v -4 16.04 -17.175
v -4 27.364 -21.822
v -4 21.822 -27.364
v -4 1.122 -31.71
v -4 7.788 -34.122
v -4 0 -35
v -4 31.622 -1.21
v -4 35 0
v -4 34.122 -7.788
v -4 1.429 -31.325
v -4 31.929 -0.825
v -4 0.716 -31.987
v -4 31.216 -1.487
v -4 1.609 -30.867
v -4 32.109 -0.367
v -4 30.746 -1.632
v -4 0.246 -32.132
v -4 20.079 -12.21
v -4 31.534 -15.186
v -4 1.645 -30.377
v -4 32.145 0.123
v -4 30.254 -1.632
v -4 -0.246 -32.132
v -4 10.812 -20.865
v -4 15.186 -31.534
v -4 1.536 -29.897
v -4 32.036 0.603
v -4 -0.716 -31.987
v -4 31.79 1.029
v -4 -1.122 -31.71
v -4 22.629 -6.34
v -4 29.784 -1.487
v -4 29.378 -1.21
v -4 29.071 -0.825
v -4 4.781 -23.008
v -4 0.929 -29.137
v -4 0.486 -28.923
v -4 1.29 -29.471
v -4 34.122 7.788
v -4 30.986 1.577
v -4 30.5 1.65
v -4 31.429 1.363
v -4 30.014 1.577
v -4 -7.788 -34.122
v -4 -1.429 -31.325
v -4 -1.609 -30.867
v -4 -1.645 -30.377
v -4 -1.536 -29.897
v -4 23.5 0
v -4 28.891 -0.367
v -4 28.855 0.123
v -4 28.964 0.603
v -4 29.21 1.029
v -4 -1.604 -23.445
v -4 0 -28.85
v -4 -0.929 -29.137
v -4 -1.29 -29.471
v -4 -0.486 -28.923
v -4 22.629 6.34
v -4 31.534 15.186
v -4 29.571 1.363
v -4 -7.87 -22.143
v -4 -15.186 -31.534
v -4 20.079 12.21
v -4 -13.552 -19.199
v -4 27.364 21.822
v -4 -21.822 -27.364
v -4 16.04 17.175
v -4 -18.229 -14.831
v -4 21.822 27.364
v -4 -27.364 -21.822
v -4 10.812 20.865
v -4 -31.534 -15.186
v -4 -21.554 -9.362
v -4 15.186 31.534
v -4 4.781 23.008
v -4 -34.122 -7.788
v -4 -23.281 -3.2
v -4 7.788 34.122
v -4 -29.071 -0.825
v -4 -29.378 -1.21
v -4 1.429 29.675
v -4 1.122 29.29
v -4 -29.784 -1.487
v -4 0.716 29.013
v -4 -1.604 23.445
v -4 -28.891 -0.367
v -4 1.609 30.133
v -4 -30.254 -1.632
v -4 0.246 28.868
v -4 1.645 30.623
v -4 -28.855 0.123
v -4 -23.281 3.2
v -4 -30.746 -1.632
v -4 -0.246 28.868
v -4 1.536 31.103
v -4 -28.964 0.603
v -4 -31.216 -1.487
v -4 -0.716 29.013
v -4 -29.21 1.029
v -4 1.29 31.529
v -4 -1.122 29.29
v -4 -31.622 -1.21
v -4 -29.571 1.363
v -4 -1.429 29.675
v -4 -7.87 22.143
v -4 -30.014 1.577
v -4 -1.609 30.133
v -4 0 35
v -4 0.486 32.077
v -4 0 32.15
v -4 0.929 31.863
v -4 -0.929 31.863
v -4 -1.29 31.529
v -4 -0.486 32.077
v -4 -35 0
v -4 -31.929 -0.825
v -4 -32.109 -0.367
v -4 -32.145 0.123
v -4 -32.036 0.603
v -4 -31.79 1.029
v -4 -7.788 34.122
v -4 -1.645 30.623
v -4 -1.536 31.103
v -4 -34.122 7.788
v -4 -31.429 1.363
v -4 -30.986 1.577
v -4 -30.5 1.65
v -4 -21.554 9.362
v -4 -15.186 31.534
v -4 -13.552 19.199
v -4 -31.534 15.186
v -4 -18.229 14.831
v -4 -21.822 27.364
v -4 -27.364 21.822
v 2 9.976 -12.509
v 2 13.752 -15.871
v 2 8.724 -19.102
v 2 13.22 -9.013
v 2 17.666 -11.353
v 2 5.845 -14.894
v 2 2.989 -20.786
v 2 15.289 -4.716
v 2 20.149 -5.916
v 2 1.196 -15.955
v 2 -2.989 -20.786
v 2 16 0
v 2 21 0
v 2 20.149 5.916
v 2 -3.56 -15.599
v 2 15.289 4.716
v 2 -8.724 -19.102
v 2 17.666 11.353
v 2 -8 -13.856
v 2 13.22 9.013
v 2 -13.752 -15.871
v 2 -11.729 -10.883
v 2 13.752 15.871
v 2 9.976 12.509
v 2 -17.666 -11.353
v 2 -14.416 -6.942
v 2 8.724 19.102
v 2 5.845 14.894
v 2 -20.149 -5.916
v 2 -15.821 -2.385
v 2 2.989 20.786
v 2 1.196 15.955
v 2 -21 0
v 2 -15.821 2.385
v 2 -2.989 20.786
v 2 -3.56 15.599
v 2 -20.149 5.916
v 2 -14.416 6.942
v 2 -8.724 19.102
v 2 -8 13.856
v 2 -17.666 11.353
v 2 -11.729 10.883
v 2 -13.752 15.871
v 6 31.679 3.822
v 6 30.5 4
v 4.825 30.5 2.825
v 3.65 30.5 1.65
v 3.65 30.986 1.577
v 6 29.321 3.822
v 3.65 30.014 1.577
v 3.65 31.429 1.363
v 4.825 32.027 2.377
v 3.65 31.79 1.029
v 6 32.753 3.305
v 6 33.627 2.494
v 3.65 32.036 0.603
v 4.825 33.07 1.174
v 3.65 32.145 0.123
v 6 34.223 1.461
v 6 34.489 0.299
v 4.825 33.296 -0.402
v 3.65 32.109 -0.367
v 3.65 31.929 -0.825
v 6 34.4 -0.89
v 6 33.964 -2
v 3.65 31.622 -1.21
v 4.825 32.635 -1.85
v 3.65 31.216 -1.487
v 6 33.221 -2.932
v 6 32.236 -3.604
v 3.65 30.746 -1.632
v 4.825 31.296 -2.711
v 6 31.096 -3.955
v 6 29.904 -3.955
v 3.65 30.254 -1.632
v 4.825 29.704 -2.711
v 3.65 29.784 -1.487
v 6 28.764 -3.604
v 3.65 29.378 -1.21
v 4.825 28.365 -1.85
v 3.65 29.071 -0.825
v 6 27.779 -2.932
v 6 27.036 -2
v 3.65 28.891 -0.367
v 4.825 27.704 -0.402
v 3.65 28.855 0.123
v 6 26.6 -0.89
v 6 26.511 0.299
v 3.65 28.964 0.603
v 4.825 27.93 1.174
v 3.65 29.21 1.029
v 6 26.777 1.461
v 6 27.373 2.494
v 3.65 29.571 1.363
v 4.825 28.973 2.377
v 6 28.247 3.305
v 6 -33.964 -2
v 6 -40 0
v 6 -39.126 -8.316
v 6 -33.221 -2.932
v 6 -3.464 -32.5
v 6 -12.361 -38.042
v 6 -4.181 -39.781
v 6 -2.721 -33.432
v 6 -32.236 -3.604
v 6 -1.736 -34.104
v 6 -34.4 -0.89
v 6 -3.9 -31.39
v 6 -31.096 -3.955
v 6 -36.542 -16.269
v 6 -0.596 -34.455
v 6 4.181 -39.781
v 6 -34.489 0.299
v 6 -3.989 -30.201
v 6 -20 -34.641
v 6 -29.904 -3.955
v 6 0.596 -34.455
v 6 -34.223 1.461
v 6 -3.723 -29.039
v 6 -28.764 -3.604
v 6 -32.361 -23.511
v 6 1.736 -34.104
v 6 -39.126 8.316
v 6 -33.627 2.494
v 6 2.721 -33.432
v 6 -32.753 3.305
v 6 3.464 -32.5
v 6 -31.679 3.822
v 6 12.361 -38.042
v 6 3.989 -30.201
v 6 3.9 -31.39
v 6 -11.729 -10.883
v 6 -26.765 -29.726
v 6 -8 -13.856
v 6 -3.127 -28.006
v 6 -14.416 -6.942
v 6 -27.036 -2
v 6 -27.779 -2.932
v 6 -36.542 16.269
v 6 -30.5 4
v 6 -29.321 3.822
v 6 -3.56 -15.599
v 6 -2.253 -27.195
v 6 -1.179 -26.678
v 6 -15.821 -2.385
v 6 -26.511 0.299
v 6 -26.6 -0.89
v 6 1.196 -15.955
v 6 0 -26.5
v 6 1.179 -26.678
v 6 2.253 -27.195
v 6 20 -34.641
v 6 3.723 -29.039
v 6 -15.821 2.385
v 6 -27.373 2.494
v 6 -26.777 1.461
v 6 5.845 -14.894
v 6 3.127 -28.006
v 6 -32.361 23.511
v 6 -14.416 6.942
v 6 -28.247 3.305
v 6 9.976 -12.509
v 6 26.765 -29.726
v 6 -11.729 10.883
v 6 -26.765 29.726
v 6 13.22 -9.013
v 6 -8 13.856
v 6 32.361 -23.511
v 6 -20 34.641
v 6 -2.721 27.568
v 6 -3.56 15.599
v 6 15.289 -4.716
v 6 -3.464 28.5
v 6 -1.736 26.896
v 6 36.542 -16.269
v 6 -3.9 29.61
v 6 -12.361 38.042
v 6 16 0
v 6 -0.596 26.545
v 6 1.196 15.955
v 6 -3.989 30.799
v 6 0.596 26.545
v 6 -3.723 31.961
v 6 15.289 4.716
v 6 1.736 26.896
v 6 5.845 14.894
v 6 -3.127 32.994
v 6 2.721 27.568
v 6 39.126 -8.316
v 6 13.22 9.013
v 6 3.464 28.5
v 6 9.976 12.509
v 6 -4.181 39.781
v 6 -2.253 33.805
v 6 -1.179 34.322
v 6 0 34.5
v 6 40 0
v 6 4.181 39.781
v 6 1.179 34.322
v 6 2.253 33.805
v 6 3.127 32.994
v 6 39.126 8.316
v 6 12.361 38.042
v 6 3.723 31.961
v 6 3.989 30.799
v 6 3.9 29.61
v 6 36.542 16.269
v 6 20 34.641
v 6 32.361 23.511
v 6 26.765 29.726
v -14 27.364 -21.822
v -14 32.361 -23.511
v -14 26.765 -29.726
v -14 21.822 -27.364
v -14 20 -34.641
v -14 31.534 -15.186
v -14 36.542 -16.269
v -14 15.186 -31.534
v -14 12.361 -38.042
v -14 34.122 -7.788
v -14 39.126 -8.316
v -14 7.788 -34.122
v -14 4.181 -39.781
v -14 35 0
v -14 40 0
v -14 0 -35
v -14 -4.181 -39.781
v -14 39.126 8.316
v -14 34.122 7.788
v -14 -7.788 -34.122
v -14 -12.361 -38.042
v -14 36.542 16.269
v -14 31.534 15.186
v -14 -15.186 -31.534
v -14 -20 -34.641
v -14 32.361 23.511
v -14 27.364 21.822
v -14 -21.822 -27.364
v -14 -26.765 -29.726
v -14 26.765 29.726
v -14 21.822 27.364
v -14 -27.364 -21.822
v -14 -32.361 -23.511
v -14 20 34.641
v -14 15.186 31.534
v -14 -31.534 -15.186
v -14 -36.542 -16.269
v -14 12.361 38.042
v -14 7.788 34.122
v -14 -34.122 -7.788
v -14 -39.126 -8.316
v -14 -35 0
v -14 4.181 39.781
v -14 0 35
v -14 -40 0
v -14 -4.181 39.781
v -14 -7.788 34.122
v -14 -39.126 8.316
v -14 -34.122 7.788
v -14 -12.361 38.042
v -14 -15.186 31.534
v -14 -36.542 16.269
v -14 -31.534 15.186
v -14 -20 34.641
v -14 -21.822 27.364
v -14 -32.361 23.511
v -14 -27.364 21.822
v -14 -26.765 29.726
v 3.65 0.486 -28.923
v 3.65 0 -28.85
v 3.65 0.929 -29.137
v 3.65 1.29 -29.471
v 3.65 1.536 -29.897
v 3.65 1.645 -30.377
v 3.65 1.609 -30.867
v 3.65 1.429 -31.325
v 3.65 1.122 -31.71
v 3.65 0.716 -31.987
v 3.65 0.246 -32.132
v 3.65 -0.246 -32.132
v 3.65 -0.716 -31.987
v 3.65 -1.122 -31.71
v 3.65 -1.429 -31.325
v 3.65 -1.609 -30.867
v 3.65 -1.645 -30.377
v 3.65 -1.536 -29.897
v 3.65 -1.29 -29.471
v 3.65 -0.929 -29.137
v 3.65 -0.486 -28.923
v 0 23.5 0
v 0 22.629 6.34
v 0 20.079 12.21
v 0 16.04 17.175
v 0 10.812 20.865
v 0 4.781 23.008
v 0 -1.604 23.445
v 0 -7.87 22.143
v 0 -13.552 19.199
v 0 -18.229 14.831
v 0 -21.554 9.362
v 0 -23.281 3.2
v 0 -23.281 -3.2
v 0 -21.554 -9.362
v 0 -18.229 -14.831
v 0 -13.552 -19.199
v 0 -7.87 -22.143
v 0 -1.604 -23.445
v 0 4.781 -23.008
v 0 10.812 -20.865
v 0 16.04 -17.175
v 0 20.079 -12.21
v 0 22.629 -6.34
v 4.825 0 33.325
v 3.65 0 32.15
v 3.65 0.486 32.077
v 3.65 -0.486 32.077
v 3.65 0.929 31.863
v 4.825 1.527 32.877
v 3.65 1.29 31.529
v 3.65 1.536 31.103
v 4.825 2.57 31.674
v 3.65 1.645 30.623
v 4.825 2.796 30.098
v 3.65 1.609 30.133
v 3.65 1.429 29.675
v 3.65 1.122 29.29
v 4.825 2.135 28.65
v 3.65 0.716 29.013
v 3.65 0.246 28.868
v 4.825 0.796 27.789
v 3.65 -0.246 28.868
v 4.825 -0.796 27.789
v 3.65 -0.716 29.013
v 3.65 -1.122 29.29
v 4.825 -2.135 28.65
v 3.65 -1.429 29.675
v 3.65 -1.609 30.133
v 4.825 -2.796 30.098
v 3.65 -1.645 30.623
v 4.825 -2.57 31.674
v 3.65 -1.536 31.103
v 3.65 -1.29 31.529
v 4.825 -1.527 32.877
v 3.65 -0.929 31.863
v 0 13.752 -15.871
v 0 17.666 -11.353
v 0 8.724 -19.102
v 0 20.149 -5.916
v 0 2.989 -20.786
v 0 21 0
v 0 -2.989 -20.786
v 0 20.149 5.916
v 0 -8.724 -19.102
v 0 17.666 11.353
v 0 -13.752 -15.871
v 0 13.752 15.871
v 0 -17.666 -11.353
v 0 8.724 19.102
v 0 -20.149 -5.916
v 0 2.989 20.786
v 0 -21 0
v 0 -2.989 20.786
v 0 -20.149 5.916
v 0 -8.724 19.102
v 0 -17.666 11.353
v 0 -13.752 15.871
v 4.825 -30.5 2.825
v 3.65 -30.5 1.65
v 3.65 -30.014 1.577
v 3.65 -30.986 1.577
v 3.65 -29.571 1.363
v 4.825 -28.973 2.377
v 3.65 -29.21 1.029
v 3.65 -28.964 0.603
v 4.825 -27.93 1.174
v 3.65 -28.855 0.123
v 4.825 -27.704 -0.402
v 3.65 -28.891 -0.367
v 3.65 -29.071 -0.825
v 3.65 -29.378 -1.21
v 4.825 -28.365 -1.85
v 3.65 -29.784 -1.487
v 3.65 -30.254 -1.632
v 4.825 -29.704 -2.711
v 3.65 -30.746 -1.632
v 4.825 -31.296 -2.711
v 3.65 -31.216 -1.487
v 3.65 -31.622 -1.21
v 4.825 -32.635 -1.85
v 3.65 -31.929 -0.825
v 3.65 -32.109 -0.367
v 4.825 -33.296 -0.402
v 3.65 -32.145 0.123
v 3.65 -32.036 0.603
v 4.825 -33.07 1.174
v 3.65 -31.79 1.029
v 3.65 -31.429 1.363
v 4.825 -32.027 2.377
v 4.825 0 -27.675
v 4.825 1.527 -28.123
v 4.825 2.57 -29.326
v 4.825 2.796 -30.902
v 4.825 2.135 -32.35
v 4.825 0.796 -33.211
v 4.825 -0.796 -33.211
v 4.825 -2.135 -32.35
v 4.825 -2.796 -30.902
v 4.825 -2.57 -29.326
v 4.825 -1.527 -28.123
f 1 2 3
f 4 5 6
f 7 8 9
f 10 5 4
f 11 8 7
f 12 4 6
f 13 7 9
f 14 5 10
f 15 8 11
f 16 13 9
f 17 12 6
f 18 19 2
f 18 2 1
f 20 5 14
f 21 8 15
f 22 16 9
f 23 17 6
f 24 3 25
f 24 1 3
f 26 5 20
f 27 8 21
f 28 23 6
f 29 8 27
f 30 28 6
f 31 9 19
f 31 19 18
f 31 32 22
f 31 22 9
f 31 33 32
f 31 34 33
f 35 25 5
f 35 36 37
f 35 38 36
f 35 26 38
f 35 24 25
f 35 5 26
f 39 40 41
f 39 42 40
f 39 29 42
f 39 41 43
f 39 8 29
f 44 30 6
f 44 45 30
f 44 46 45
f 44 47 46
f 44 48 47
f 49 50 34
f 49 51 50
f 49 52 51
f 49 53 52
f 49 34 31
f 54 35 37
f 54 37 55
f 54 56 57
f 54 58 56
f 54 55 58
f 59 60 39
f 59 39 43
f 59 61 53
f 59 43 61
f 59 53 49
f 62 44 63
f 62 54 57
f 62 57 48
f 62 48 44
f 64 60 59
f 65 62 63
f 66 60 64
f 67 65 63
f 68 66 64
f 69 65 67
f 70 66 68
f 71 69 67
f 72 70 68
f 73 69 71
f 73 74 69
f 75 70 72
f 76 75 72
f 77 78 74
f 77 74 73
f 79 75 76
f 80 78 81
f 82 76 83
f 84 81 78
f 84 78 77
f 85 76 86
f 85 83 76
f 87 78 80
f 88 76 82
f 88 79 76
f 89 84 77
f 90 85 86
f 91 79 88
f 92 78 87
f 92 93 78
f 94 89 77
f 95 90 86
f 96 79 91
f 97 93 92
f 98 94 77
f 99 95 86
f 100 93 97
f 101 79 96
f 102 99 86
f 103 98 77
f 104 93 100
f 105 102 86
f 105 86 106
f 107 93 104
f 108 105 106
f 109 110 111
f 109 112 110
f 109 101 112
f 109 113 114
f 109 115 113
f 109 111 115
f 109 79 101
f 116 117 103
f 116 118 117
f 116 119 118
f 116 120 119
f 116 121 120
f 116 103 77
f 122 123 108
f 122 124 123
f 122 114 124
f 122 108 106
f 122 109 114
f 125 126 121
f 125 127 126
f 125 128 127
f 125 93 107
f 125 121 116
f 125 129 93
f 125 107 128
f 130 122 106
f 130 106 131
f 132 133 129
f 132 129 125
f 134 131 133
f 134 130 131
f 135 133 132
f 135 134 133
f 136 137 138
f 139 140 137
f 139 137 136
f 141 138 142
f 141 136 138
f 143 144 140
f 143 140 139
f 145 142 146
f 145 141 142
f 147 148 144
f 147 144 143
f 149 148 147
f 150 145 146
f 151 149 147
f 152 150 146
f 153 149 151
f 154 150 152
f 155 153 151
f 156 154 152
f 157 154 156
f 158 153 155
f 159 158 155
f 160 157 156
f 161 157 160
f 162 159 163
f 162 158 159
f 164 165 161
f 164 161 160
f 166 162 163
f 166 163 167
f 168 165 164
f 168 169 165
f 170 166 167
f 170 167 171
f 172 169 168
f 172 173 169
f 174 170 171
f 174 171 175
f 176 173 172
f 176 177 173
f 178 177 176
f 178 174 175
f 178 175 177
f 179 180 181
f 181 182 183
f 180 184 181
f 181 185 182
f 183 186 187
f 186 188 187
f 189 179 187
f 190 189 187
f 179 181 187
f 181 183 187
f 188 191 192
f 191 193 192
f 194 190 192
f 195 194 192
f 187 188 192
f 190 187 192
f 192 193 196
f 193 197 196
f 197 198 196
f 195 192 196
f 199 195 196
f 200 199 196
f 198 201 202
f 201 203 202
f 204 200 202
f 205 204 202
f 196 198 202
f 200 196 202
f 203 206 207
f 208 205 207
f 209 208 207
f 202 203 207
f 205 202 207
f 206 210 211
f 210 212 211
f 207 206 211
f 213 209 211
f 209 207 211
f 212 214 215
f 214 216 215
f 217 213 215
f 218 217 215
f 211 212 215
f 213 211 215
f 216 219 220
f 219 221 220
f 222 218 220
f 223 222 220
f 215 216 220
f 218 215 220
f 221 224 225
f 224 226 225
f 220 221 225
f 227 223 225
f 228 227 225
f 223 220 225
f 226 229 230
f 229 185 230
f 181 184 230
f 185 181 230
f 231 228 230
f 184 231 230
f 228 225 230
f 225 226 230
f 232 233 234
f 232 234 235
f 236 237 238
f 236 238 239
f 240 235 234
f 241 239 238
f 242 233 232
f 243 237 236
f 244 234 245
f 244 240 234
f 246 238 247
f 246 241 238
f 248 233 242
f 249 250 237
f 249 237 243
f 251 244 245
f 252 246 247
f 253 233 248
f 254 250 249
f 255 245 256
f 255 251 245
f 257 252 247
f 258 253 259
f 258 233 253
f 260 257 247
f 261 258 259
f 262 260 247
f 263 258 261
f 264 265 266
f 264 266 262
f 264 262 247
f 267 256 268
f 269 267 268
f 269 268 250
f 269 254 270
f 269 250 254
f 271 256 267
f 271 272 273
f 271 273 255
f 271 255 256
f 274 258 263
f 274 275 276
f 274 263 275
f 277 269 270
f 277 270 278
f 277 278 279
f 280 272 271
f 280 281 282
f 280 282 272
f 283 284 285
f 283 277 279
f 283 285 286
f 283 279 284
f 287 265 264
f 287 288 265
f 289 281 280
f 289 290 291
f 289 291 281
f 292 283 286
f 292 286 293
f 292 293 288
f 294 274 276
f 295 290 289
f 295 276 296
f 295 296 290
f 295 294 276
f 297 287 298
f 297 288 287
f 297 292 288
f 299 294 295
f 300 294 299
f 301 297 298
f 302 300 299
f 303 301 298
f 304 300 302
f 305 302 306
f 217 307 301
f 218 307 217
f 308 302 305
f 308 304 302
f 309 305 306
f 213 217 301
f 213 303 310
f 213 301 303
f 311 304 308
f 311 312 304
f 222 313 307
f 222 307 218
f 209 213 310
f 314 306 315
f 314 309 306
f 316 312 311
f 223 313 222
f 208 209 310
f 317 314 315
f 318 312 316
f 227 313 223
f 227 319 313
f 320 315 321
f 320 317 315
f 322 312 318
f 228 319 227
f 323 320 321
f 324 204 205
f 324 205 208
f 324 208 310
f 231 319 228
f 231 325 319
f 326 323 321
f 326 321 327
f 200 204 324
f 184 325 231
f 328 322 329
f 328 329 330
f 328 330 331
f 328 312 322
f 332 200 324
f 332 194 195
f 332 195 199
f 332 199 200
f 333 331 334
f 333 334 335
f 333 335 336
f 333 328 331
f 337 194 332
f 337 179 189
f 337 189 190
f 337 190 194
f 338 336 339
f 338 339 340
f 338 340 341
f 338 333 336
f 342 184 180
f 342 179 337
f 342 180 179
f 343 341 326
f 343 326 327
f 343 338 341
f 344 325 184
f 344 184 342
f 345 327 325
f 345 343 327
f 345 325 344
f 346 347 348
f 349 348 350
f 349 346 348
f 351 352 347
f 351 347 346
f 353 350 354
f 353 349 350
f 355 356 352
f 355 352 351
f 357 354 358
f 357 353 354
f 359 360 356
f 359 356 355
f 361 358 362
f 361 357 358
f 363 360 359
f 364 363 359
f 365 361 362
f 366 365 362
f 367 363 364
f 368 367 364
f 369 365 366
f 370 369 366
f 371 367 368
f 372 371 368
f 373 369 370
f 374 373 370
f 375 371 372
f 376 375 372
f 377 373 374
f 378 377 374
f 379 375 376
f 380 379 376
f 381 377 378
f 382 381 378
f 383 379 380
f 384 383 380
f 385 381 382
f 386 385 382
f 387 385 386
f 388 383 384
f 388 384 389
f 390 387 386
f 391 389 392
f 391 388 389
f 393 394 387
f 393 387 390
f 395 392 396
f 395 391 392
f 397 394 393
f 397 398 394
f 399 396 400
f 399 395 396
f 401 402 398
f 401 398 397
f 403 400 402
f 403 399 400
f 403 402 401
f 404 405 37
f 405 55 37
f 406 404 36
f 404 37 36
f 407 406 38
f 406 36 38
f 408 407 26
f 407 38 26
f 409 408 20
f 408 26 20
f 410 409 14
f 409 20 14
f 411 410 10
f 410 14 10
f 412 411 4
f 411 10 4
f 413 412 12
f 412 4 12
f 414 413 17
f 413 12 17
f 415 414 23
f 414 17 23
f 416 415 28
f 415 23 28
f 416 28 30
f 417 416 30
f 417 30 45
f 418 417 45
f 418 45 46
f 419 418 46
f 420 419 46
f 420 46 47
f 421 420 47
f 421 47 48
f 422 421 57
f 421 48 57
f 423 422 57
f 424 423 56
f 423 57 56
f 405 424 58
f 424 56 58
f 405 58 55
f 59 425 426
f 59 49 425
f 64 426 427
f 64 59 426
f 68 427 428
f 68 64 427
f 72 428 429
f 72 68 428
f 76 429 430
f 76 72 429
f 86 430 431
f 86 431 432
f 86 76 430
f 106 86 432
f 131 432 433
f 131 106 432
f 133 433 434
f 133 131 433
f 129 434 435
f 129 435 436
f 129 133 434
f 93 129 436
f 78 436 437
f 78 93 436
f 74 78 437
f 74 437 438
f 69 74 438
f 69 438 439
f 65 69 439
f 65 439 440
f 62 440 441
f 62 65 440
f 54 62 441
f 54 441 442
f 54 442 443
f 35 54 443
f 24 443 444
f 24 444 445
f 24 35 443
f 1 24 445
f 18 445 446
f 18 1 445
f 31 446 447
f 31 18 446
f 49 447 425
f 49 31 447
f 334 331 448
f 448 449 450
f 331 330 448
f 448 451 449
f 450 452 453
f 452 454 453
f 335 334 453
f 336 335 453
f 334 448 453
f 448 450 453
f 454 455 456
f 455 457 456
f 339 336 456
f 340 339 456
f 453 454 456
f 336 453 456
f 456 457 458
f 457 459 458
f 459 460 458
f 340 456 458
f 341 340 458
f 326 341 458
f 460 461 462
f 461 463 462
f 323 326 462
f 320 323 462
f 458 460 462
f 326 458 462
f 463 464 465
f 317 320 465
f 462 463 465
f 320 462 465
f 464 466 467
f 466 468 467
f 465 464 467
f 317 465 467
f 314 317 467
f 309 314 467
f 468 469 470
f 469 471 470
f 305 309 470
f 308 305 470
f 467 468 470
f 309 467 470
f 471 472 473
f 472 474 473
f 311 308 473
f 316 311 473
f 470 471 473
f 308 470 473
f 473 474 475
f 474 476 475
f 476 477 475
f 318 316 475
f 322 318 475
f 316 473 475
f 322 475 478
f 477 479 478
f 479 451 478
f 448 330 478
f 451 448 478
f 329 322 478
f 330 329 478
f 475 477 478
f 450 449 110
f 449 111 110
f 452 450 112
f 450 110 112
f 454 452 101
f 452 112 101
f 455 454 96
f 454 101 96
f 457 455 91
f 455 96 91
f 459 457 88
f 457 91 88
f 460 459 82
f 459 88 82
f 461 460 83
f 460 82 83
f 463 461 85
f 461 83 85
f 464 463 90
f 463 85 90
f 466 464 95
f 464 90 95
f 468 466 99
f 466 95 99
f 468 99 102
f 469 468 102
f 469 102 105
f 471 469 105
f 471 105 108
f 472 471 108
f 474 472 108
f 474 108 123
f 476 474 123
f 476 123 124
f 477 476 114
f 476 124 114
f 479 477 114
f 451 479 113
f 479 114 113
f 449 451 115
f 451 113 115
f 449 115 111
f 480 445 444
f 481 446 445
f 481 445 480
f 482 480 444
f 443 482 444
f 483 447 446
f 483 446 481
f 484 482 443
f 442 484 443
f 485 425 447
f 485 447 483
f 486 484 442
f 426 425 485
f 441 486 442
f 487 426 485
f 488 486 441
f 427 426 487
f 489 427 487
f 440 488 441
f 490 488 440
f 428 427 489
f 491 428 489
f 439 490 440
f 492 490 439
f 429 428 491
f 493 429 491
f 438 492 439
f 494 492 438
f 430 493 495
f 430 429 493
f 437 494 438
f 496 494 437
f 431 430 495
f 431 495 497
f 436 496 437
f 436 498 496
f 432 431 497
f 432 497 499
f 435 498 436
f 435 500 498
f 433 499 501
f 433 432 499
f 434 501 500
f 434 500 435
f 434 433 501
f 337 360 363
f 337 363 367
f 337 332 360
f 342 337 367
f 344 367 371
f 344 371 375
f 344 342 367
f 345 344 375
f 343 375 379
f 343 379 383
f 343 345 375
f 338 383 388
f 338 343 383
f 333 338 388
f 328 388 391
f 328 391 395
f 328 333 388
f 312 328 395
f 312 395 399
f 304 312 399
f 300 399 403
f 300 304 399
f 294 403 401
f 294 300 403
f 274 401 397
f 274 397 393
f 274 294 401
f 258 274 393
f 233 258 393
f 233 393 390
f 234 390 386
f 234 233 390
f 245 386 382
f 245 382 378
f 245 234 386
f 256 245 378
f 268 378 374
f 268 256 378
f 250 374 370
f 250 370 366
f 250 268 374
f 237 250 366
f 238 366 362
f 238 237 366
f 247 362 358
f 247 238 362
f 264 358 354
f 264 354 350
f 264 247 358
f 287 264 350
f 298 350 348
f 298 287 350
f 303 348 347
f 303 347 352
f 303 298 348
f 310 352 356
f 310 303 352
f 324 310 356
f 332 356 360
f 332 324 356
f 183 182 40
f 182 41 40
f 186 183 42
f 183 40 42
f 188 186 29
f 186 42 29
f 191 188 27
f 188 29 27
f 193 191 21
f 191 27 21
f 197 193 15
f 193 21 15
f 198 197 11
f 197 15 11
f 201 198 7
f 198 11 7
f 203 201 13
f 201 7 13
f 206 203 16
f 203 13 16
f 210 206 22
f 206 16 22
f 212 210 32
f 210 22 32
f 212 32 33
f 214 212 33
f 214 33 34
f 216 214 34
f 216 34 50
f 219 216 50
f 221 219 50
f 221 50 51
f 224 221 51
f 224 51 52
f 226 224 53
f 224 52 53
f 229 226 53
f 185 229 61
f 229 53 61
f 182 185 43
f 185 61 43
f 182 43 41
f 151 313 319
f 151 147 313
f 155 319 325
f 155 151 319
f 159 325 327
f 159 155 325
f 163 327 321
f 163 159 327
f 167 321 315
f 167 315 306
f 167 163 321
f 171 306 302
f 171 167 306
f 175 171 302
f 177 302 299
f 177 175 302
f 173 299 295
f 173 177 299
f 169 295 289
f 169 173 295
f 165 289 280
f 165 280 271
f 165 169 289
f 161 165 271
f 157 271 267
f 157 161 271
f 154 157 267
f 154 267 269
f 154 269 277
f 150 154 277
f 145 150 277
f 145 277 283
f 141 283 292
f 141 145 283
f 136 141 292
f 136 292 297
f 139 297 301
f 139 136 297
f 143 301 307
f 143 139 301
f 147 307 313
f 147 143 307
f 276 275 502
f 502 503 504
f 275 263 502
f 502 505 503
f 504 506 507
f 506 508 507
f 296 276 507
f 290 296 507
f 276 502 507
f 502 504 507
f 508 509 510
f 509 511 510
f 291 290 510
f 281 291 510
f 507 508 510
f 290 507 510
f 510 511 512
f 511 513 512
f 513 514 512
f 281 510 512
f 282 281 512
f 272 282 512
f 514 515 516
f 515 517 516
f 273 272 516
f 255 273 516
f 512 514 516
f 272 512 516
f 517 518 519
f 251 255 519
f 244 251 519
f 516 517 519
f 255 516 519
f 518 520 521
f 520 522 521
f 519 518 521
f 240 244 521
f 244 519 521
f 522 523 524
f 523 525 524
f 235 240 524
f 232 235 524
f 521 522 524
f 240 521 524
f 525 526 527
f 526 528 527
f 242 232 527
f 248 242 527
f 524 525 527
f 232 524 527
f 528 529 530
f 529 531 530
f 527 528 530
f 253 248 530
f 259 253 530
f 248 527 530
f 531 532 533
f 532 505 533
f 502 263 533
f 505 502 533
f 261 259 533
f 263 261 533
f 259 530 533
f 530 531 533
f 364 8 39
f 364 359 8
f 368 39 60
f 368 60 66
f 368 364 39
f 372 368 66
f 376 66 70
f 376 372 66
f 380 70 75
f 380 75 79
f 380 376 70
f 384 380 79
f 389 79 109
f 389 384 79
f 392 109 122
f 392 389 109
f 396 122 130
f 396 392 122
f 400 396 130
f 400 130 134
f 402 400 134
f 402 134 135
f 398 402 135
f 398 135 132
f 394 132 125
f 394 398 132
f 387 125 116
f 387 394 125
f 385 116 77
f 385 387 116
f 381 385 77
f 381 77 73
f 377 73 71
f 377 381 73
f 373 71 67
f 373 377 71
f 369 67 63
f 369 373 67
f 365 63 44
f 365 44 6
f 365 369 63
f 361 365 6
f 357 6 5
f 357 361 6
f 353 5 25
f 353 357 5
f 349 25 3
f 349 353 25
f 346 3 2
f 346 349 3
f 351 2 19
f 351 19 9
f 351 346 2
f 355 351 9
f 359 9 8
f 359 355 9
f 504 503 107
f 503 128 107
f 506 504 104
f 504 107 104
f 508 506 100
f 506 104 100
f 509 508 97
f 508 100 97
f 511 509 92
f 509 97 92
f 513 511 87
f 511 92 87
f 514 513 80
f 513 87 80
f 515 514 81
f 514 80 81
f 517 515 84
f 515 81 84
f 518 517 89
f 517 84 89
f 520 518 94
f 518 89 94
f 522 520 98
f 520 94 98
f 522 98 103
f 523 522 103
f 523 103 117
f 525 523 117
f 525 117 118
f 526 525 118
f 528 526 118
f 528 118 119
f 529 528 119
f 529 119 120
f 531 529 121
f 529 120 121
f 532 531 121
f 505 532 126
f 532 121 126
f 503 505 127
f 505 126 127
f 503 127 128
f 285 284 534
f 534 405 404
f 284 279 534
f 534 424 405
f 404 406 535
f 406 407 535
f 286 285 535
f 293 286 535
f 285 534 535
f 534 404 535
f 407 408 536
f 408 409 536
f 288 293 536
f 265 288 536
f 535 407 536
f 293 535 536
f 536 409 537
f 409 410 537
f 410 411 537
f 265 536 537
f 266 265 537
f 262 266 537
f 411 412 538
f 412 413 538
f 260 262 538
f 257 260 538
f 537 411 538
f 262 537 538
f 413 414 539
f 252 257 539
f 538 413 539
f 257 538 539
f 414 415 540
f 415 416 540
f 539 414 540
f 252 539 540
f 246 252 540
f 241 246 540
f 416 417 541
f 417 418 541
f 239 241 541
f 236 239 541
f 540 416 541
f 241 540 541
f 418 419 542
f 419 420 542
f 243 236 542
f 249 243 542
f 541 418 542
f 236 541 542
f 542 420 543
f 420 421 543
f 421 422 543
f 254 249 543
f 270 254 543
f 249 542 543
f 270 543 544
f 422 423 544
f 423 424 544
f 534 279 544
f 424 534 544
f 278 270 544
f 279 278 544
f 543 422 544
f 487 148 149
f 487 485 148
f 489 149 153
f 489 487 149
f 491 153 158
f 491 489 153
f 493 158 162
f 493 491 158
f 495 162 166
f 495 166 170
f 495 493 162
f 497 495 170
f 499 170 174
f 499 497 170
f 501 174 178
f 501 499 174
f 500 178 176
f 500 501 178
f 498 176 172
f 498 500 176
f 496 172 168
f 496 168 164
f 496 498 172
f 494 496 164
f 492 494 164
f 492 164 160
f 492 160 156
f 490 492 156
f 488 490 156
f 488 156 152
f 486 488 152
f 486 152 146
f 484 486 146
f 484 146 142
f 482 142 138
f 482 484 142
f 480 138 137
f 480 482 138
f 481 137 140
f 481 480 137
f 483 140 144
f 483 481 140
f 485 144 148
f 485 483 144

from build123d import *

# Parameters (mm, degrees)
M4X0_7_TAPPED_HOLE1_D           = 3.3
M4X0_7_TAPPED_HOLE1_CSINK_D     = 8
M4X0_7_TAPPED_HOLE1_CSINK_ANGLE = 90


with BuildPart() as part:
    # Sketch2 → Revolve1 (revolve)
    with BuildSketch(Plane.XY):
        Polygon((-14, 40), (6, 40), (6, 16), (2, 16), (2, 21), (0, 21), (0, 23.5), (-4, 23.5), (-4, 35), (-14, 35), align=None)
    revolve(axis=Axis((-28.224413871, 0, 0), (1, 0, 0)))

    # M4x0.7 Tapped Hole1 (through all)
    with Locations(Plane(origin=(6, 0, 0), x_dir=(0, 0, -1), z_dir=(1, 0, 0))):
        with Locations((0, 30.5), (30.5, 0), (0, -30.5), (-30.5, 0)):
            CounterSinkHole(M4X0_7_TAPPED_HOLE1_D / 2, M4X0_7_TAPPED_HOLE1_CSINK_D / 2, counter_sink_angle=M4X0_7_TAPPED_HOLE1_CSINK_ANGLE)


solid = part.part
